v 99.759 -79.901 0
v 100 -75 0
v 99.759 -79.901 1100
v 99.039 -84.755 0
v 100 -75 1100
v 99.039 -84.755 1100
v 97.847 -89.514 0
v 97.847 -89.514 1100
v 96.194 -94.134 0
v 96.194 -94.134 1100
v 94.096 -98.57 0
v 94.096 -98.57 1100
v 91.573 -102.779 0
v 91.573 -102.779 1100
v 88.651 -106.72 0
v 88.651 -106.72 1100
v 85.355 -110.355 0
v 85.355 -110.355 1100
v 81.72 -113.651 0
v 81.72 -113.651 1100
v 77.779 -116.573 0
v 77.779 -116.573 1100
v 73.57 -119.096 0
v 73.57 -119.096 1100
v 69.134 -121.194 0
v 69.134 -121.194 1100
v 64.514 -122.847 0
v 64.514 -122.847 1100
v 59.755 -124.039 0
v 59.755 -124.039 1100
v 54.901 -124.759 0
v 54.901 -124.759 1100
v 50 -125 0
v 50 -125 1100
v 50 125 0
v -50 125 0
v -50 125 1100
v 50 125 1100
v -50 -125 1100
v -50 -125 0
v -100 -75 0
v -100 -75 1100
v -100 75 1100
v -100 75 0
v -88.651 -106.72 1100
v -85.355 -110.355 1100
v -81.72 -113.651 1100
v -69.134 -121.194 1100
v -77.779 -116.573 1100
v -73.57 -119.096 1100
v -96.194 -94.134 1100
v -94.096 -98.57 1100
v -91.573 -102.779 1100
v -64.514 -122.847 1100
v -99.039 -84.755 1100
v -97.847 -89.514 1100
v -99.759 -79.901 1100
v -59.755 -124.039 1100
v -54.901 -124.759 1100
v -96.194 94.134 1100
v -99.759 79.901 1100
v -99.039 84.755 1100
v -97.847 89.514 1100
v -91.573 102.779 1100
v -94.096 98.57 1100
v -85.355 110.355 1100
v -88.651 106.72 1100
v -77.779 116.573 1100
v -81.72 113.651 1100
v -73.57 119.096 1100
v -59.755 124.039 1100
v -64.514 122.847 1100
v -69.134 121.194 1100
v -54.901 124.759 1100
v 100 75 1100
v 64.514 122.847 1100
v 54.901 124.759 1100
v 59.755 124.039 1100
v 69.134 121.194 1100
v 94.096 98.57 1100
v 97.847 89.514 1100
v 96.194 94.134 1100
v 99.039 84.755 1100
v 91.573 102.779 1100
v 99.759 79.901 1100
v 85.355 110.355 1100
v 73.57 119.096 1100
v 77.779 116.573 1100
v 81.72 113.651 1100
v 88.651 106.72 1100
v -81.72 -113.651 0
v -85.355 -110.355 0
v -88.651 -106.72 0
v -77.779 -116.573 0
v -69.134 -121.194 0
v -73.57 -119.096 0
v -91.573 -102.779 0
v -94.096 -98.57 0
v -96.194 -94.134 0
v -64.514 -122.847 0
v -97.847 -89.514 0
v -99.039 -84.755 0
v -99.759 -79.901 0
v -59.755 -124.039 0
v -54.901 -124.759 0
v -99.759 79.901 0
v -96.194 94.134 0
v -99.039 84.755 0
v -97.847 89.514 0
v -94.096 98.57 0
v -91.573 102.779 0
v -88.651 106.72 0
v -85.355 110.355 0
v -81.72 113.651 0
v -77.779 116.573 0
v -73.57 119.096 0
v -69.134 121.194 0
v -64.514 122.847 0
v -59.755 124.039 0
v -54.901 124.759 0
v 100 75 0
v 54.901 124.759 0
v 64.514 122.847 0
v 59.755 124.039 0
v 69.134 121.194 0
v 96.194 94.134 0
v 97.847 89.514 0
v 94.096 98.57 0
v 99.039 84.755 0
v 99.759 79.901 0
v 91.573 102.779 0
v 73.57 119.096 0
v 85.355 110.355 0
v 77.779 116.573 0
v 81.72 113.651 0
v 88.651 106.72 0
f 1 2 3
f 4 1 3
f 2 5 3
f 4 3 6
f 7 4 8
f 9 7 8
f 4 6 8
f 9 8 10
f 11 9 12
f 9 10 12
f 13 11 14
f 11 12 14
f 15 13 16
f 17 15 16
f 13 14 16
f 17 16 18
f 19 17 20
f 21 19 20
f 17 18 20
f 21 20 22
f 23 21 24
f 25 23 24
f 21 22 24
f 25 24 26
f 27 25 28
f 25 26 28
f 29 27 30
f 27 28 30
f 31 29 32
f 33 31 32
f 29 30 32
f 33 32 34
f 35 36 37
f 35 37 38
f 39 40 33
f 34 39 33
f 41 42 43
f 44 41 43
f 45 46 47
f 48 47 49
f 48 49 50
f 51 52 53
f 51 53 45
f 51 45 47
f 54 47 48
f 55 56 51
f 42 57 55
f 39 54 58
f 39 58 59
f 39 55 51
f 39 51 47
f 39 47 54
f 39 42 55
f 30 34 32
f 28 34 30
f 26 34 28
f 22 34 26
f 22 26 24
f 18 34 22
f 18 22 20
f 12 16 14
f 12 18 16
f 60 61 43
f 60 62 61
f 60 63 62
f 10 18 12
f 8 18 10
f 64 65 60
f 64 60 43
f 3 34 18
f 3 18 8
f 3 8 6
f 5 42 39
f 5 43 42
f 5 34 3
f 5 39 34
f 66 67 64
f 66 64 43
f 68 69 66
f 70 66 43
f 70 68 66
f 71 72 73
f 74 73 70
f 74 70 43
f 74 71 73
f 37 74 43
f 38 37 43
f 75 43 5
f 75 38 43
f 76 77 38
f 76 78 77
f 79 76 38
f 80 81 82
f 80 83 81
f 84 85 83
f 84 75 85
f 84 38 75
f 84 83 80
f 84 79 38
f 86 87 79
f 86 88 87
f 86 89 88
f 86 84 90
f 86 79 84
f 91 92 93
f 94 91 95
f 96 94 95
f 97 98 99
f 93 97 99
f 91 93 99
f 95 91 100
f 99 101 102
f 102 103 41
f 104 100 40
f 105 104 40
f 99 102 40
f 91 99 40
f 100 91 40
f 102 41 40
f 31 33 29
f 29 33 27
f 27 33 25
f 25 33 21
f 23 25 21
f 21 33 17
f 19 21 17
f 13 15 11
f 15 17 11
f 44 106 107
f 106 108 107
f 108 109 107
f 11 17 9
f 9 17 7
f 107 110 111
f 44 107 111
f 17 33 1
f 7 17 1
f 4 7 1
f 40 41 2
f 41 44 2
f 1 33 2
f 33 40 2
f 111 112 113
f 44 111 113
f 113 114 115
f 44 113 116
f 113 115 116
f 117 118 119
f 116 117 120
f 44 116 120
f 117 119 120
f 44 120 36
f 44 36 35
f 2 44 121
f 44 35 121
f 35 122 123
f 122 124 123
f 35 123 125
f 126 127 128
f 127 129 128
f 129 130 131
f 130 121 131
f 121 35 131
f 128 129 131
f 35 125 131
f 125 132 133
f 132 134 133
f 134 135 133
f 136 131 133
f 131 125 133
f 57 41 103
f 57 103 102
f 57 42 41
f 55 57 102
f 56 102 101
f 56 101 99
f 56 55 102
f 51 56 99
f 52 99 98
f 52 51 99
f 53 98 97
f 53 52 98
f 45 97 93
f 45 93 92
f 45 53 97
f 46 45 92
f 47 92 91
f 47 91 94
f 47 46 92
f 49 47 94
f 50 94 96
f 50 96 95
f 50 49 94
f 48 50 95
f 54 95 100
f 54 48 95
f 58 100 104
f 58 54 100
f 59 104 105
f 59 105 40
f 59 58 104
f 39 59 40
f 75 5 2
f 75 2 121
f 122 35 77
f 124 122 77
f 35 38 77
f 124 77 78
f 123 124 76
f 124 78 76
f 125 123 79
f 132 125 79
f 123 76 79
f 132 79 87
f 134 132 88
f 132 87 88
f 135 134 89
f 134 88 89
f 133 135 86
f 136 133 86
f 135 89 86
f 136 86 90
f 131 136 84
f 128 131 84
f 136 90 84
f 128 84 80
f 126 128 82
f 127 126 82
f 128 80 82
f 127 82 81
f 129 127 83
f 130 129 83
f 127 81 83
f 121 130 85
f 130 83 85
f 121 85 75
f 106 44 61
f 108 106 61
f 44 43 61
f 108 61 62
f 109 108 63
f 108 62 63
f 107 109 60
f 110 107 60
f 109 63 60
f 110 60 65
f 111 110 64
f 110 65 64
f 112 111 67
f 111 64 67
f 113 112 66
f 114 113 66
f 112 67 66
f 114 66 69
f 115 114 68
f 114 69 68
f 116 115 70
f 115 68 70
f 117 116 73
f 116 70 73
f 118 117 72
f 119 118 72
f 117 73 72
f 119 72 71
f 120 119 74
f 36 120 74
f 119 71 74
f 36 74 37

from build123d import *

# Parameters (mm, degrees)
SKETCH1_W           = 200
SKETCH1_H           = 250
BOSS_EXTRUDE1_DEPTH = 1100
FILLET1_R           = 50
FILLET2_R           = 50
FILLET3_R           = 50
FILLET4_R           = 50


with BuildPart() as part:
    # Sketch1 → Boss-Extrude1 (new body)
    with BuildSketch(Plane.XY):
        Rectangle(SKETCH1_W, SKETCH1_H)
    extrude(amount=BOSS_EXTRUDE1_DEPTH)

    # Fillet1
    fillet1_edges = [part.edges().sort_by_distance(p)[0] for p in [
        (-100, 125, 550),
    ]]
    fillet(fillet1_edges, radius=FILLET1_R)

    # Fillet2
    fillet2_edges = [part.edges().sort_by_distance(p)[0] for p in [
        (-100, -125, 550),
    ]]
    fillet(fillet2_edges, radius=FILLET2_R)

    # Fillet3
    fillet3_edges = [part.edges().sort_by_distance(p)[0] for p in [
        (100, 125, 550),
    ]]
    fillet(fillet3_edges, radius=FILLET3_R)

    # Fillet4
    fillet4_edges = [part.edges().sort_by_distance(p)[0] for p in [
        (100, -125, 550),
    ]]
    fillet(fillet4_edges, radius=FILLET4_R)


solid = part.part
